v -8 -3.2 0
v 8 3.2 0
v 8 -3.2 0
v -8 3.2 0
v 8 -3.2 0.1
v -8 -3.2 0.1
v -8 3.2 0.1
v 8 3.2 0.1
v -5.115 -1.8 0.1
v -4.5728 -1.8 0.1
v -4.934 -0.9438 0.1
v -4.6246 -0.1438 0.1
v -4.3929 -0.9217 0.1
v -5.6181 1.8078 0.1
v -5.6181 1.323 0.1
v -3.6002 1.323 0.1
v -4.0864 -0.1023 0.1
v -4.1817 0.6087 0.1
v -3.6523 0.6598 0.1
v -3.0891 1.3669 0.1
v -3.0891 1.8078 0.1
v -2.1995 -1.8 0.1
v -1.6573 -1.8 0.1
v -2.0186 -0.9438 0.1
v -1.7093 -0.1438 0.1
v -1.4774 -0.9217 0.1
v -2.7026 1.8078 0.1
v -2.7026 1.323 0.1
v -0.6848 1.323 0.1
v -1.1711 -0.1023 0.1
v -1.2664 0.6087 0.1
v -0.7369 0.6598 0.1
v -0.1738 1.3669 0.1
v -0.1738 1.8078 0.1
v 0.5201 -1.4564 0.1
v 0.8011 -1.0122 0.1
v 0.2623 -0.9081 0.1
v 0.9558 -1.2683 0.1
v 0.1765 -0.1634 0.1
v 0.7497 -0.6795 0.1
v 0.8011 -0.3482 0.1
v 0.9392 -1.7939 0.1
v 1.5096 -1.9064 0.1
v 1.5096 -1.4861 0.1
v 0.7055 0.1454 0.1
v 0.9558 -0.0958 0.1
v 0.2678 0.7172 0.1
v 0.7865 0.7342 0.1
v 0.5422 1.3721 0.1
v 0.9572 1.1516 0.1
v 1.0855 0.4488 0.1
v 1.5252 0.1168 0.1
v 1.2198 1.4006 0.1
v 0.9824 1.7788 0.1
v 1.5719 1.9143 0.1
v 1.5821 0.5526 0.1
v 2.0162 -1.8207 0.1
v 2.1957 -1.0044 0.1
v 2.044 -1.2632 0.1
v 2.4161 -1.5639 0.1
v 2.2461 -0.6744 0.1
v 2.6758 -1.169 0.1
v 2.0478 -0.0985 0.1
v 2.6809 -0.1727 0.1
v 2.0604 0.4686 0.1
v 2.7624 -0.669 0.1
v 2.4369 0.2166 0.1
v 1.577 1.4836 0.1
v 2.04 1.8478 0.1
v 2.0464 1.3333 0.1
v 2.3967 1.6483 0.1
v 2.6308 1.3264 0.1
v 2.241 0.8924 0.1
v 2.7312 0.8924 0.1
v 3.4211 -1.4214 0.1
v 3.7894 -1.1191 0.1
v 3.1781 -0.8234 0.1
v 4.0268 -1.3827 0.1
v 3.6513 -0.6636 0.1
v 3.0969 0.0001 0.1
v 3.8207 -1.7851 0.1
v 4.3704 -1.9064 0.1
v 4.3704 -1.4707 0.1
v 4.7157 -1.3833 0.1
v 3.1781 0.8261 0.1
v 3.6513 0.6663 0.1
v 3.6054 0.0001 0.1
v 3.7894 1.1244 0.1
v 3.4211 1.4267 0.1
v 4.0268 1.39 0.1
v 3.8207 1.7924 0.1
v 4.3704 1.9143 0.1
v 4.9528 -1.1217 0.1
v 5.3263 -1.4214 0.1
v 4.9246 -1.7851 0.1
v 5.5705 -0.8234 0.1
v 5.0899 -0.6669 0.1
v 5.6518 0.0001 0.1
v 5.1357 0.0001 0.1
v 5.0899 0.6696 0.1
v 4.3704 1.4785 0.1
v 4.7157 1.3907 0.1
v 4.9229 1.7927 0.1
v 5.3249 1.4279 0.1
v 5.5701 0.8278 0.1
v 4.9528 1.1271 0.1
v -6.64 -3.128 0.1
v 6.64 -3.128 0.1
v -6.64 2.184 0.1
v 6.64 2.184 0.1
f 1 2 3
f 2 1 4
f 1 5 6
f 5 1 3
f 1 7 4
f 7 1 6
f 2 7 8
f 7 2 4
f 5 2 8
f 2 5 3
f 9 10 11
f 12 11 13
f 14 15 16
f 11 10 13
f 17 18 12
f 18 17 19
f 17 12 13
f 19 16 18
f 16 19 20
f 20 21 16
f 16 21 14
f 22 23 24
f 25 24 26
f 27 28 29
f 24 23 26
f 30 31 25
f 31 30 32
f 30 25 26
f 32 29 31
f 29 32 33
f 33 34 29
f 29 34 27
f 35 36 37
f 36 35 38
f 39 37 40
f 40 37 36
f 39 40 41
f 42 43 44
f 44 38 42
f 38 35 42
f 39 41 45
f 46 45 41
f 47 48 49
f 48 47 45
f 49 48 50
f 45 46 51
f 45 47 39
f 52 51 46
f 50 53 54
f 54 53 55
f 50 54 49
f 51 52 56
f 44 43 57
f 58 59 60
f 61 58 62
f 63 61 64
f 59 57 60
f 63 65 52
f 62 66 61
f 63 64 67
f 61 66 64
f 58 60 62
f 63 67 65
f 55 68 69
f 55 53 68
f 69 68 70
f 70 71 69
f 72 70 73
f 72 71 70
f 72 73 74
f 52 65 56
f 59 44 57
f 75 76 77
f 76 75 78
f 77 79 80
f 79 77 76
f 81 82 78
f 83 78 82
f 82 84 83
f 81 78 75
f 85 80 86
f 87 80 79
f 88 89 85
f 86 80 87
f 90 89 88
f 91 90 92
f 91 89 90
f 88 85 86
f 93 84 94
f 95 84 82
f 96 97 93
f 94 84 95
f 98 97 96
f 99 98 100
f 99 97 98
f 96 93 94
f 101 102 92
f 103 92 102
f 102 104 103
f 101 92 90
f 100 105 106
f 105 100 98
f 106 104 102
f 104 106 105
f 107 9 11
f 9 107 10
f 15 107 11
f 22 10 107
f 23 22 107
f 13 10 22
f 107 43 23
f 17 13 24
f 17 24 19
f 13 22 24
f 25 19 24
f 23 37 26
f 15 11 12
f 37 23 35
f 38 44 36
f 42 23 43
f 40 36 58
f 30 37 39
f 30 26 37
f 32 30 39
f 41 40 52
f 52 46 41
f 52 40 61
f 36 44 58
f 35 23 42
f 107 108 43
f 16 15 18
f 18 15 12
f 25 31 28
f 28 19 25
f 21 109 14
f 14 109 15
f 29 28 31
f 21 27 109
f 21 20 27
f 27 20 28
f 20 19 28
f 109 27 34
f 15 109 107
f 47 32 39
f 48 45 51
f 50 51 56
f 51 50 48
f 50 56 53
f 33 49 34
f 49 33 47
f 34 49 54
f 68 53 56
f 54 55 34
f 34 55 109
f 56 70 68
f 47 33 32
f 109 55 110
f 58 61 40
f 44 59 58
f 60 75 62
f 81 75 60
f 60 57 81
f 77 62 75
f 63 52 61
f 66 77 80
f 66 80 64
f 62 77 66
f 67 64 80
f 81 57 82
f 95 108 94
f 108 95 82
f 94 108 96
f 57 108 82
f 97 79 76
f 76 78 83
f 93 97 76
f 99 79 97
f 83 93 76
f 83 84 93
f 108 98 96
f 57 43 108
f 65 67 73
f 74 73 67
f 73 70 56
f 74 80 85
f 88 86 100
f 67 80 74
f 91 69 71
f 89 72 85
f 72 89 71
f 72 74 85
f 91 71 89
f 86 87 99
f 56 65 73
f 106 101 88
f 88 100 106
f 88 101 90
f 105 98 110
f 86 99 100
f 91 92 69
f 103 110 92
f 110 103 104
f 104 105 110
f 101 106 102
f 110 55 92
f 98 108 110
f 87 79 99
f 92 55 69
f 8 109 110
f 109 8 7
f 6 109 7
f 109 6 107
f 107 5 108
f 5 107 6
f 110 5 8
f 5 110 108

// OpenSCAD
use <../lib.scad>
use <../p/box5-12.scad>
use <s/191936s01.scad>
$fa=1; $fs=0.2;
function ldraw_lib__191936b(realsolid=false) = [
// 0 Sticker  0.8 x  2 with White "7760"
// 0 Name: 191936b.dat
// 0 Author: Steffen [Steffen]
// 0 !LDRAW_ORG Part UPDATE 2012-01
// 0 !LICENSE Licensed under CC BY 2.0 and CC BY 4.0 : see CAreadme.txt
// 
// 0 BFC CERTIFY CCW
  [0,"BFC","CERTIFY"],
  [0,"BFC","CCW"],
// 
// 0 !HISTORY 2012-03-30 [PTadmin] Official Update 2012-01
// 
// 
// 1 16 0 -0.25 0 20 0 0 0 0.25 0 0 0 -8 box5-12.dat
  [1,16,0,-0.25,0,20,0,0,0,0.25,0,0,0,-8, ldraw_lib__box5_12(realsolid)],
// 1 16 0 -0.25 -4.5 0.415 0 0 0 1 0 0 0 0.415 s\191936s01.dat
  [1,16,0,-0.25,-4.5,0.415,0,0,0,1,0,0,0,0.415, ldraw_lib__s__191936s01(realsolid)],
// 4 16 -20 -0.25 8 -16.6 -0.25 5.46 16.6 -0.25 5.46 20 -0.25 8
  [4,16,-20,-0.25,8,-16.6,-0.25,5.46,16.6,-0.25,5.46,20,-0.25,8],
// 4 16 -16.6 -0.25 5.46 -20 -0.25 8 -20 -0.25 -8 -16.6 -0.25 -7.82
  [4,16,-16.6,-0.25,5.46,-20,-0.25,8,-20,-0.25,-8,-16.6,-0.25,-7.82],
// 4 16 -16.6 -0.25 -7.82 -20 -0.25 -8 20 -0.25 -8 16.6 -0.25 -7.82
  [4,16,-16.6,-0.25,-7.82,-20,-0.25,-8,20,-0.25,-8,16.6,-0.25,-7.82],
// 4 16 20 -0.25 8 16.6 -0.25 5.46 16.6 -0.25 -7.82 20 -0.25 -8
  [4,16,20,-0.25,8,16.6,-0.25,5.46,16.6,-0.25,-7.82,20,-0.25,-8],
// 0
];
module ldraw_lib__191936b(step=0, col=false, unit=2/5, alt=false, line=0.2, solid=!$preview)
    makepoly(ldraw_lib__191936b(solid), step=step, col=col, unit=unit, alt=alt, line=line, solid=solid);
ldraw_lib__191936b(line=0.2);
